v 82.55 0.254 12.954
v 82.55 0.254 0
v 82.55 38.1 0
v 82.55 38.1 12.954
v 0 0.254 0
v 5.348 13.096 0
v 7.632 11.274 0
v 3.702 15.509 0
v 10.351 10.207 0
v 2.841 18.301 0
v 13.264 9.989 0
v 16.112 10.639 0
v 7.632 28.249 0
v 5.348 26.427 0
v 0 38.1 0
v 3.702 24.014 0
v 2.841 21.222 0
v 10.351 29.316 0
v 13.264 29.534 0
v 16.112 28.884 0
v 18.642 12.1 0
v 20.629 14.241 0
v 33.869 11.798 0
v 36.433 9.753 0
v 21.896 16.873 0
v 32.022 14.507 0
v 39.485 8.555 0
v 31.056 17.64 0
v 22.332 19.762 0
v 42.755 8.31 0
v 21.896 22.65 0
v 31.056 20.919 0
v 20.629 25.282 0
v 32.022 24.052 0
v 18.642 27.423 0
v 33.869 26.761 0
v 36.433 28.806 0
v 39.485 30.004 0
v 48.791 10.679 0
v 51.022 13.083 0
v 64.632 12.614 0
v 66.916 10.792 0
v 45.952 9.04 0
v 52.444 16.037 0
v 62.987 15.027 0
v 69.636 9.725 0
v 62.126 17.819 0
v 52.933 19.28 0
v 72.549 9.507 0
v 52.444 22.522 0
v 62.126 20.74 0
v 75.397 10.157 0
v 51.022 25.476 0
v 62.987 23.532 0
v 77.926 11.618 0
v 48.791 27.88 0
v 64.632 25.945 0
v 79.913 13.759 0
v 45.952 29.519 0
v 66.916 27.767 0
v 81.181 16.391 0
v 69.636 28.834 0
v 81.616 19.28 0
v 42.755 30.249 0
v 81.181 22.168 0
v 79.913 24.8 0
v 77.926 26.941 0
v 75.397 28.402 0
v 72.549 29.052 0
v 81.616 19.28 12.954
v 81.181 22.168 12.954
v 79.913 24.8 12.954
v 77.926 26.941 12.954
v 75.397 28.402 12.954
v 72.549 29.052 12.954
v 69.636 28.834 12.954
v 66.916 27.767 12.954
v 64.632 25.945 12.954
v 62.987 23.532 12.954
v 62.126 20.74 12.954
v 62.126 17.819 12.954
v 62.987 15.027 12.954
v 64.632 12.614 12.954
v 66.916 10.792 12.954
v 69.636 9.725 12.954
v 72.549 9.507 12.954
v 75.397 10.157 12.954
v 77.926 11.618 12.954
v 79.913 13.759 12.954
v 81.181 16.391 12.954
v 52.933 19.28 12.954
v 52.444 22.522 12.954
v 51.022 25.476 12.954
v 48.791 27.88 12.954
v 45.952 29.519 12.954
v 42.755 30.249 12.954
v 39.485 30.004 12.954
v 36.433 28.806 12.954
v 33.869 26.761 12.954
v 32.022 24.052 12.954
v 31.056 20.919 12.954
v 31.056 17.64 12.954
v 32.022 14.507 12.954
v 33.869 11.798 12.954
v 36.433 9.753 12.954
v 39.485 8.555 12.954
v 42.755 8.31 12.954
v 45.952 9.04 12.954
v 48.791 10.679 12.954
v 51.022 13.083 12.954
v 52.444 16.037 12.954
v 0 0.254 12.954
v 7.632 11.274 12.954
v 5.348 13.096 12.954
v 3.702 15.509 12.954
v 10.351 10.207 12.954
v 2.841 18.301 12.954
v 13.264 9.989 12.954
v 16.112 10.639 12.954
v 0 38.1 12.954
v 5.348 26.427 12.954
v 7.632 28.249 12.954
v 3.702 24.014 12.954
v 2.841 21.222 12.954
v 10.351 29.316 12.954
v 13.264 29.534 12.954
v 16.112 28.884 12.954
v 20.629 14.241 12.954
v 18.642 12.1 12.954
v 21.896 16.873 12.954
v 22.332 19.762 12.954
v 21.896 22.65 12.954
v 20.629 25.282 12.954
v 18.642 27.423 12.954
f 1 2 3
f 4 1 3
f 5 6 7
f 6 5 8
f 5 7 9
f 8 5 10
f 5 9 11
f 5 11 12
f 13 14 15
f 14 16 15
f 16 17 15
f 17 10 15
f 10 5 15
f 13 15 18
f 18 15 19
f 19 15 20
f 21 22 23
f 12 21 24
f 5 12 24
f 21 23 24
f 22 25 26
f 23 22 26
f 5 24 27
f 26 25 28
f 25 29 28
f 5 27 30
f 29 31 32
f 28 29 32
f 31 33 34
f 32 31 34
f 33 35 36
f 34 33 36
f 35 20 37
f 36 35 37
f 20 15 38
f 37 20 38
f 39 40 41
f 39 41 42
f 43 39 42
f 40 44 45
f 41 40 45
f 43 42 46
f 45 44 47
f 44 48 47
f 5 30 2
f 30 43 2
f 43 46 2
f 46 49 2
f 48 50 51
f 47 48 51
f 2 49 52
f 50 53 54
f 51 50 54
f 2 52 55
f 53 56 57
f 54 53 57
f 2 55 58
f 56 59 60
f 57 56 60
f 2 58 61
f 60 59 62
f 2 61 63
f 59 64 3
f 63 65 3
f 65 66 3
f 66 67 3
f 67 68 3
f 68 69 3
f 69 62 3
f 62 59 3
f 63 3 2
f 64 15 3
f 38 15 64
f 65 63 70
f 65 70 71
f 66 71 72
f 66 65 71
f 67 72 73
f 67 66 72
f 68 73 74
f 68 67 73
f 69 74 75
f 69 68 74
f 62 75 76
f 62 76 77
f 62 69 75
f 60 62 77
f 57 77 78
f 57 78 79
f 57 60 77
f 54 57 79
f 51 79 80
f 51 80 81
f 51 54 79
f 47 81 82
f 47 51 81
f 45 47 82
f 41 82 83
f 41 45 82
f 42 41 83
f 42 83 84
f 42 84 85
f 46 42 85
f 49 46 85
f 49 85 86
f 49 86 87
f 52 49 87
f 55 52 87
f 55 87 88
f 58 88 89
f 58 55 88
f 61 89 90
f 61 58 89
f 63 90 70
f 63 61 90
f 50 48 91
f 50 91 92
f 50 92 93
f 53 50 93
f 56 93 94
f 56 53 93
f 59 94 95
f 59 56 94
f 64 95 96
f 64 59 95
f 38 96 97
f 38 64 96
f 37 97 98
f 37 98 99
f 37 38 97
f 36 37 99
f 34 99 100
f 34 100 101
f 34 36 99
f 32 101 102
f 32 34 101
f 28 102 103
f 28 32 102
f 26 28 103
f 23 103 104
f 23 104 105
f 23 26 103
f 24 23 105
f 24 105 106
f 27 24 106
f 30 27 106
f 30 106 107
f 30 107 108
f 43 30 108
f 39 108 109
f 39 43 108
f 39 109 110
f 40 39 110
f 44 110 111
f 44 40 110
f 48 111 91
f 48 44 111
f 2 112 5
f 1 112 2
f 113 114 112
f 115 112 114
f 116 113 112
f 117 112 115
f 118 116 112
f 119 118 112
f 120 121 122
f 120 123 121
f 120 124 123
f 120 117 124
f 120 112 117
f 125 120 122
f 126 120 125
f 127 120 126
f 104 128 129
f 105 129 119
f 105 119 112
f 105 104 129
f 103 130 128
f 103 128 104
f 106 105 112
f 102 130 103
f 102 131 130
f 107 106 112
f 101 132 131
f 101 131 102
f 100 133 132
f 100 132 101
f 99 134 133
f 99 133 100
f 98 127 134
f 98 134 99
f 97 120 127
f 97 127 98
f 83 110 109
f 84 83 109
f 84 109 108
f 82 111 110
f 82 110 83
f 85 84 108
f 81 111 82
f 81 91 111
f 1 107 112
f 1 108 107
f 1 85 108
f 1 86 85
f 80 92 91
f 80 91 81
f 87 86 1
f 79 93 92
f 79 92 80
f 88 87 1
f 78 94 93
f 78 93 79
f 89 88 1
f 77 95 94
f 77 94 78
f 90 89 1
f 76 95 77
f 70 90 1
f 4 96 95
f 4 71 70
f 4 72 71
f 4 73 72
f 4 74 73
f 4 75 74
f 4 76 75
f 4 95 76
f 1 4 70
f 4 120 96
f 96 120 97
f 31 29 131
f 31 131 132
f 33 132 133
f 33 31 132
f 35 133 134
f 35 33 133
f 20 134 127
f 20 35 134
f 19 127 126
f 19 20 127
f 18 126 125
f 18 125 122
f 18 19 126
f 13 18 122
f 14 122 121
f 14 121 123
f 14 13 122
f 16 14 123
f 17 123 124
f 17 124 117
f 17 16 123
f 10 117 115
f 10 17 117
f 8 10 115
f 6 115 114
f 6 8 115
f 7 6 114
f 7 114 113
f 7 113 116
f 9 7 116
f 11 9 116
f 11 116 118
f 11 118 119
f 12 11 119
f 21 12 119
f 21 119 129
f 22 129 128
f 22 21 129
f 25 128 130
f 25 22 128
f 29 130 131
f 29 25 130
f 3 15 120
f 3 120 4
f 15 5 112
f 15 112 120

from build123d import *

# Parameters (mm, degrees)
F0_W      = 82.55
F0_H      = 38.1
F0_R      = 9.8
F0_R_2    = 11
F1_DEPTH  = 12.954
F1_FACE_W = 82.55
F1_FACE_H = 12.954
F2_DEPTH  = 0.254


with BuildPart() as f1:
    # F0 (on Top) → F1 (new body)
    with BuildSketch(Plane.XY):
        with Locations((41.275, 19.05)):
            Rectangle(F0_W, F0_H)
        with Locations((12.531688, 19.761506)):
            Circle(F0_R, mode=Mode.SUBTRACT)
        with Locations((41.932955, 19.279519)):
            Circle(F0_R_2, mode=Mode.SUBTRACT)
        with Locations((71.816206, 19.279519)):
            Circle(F0_R, mode=Mode.SUBTRACT)
    extrude(amount=F1_DEPTH)

    # F1_face (on face) → F2 (cut)
    with BuildSketch(Plane(origin=(41.275, 0, 6.477), x_dir=(1, 0, 0), z_dir=(0, -1, 0))):
        Rectangle(F1_FACE_W, F1_FACE_H)
    extrude(amount=-F2_DEPTH, mode=Mode.SUBTRACT)


solid = f1.part
